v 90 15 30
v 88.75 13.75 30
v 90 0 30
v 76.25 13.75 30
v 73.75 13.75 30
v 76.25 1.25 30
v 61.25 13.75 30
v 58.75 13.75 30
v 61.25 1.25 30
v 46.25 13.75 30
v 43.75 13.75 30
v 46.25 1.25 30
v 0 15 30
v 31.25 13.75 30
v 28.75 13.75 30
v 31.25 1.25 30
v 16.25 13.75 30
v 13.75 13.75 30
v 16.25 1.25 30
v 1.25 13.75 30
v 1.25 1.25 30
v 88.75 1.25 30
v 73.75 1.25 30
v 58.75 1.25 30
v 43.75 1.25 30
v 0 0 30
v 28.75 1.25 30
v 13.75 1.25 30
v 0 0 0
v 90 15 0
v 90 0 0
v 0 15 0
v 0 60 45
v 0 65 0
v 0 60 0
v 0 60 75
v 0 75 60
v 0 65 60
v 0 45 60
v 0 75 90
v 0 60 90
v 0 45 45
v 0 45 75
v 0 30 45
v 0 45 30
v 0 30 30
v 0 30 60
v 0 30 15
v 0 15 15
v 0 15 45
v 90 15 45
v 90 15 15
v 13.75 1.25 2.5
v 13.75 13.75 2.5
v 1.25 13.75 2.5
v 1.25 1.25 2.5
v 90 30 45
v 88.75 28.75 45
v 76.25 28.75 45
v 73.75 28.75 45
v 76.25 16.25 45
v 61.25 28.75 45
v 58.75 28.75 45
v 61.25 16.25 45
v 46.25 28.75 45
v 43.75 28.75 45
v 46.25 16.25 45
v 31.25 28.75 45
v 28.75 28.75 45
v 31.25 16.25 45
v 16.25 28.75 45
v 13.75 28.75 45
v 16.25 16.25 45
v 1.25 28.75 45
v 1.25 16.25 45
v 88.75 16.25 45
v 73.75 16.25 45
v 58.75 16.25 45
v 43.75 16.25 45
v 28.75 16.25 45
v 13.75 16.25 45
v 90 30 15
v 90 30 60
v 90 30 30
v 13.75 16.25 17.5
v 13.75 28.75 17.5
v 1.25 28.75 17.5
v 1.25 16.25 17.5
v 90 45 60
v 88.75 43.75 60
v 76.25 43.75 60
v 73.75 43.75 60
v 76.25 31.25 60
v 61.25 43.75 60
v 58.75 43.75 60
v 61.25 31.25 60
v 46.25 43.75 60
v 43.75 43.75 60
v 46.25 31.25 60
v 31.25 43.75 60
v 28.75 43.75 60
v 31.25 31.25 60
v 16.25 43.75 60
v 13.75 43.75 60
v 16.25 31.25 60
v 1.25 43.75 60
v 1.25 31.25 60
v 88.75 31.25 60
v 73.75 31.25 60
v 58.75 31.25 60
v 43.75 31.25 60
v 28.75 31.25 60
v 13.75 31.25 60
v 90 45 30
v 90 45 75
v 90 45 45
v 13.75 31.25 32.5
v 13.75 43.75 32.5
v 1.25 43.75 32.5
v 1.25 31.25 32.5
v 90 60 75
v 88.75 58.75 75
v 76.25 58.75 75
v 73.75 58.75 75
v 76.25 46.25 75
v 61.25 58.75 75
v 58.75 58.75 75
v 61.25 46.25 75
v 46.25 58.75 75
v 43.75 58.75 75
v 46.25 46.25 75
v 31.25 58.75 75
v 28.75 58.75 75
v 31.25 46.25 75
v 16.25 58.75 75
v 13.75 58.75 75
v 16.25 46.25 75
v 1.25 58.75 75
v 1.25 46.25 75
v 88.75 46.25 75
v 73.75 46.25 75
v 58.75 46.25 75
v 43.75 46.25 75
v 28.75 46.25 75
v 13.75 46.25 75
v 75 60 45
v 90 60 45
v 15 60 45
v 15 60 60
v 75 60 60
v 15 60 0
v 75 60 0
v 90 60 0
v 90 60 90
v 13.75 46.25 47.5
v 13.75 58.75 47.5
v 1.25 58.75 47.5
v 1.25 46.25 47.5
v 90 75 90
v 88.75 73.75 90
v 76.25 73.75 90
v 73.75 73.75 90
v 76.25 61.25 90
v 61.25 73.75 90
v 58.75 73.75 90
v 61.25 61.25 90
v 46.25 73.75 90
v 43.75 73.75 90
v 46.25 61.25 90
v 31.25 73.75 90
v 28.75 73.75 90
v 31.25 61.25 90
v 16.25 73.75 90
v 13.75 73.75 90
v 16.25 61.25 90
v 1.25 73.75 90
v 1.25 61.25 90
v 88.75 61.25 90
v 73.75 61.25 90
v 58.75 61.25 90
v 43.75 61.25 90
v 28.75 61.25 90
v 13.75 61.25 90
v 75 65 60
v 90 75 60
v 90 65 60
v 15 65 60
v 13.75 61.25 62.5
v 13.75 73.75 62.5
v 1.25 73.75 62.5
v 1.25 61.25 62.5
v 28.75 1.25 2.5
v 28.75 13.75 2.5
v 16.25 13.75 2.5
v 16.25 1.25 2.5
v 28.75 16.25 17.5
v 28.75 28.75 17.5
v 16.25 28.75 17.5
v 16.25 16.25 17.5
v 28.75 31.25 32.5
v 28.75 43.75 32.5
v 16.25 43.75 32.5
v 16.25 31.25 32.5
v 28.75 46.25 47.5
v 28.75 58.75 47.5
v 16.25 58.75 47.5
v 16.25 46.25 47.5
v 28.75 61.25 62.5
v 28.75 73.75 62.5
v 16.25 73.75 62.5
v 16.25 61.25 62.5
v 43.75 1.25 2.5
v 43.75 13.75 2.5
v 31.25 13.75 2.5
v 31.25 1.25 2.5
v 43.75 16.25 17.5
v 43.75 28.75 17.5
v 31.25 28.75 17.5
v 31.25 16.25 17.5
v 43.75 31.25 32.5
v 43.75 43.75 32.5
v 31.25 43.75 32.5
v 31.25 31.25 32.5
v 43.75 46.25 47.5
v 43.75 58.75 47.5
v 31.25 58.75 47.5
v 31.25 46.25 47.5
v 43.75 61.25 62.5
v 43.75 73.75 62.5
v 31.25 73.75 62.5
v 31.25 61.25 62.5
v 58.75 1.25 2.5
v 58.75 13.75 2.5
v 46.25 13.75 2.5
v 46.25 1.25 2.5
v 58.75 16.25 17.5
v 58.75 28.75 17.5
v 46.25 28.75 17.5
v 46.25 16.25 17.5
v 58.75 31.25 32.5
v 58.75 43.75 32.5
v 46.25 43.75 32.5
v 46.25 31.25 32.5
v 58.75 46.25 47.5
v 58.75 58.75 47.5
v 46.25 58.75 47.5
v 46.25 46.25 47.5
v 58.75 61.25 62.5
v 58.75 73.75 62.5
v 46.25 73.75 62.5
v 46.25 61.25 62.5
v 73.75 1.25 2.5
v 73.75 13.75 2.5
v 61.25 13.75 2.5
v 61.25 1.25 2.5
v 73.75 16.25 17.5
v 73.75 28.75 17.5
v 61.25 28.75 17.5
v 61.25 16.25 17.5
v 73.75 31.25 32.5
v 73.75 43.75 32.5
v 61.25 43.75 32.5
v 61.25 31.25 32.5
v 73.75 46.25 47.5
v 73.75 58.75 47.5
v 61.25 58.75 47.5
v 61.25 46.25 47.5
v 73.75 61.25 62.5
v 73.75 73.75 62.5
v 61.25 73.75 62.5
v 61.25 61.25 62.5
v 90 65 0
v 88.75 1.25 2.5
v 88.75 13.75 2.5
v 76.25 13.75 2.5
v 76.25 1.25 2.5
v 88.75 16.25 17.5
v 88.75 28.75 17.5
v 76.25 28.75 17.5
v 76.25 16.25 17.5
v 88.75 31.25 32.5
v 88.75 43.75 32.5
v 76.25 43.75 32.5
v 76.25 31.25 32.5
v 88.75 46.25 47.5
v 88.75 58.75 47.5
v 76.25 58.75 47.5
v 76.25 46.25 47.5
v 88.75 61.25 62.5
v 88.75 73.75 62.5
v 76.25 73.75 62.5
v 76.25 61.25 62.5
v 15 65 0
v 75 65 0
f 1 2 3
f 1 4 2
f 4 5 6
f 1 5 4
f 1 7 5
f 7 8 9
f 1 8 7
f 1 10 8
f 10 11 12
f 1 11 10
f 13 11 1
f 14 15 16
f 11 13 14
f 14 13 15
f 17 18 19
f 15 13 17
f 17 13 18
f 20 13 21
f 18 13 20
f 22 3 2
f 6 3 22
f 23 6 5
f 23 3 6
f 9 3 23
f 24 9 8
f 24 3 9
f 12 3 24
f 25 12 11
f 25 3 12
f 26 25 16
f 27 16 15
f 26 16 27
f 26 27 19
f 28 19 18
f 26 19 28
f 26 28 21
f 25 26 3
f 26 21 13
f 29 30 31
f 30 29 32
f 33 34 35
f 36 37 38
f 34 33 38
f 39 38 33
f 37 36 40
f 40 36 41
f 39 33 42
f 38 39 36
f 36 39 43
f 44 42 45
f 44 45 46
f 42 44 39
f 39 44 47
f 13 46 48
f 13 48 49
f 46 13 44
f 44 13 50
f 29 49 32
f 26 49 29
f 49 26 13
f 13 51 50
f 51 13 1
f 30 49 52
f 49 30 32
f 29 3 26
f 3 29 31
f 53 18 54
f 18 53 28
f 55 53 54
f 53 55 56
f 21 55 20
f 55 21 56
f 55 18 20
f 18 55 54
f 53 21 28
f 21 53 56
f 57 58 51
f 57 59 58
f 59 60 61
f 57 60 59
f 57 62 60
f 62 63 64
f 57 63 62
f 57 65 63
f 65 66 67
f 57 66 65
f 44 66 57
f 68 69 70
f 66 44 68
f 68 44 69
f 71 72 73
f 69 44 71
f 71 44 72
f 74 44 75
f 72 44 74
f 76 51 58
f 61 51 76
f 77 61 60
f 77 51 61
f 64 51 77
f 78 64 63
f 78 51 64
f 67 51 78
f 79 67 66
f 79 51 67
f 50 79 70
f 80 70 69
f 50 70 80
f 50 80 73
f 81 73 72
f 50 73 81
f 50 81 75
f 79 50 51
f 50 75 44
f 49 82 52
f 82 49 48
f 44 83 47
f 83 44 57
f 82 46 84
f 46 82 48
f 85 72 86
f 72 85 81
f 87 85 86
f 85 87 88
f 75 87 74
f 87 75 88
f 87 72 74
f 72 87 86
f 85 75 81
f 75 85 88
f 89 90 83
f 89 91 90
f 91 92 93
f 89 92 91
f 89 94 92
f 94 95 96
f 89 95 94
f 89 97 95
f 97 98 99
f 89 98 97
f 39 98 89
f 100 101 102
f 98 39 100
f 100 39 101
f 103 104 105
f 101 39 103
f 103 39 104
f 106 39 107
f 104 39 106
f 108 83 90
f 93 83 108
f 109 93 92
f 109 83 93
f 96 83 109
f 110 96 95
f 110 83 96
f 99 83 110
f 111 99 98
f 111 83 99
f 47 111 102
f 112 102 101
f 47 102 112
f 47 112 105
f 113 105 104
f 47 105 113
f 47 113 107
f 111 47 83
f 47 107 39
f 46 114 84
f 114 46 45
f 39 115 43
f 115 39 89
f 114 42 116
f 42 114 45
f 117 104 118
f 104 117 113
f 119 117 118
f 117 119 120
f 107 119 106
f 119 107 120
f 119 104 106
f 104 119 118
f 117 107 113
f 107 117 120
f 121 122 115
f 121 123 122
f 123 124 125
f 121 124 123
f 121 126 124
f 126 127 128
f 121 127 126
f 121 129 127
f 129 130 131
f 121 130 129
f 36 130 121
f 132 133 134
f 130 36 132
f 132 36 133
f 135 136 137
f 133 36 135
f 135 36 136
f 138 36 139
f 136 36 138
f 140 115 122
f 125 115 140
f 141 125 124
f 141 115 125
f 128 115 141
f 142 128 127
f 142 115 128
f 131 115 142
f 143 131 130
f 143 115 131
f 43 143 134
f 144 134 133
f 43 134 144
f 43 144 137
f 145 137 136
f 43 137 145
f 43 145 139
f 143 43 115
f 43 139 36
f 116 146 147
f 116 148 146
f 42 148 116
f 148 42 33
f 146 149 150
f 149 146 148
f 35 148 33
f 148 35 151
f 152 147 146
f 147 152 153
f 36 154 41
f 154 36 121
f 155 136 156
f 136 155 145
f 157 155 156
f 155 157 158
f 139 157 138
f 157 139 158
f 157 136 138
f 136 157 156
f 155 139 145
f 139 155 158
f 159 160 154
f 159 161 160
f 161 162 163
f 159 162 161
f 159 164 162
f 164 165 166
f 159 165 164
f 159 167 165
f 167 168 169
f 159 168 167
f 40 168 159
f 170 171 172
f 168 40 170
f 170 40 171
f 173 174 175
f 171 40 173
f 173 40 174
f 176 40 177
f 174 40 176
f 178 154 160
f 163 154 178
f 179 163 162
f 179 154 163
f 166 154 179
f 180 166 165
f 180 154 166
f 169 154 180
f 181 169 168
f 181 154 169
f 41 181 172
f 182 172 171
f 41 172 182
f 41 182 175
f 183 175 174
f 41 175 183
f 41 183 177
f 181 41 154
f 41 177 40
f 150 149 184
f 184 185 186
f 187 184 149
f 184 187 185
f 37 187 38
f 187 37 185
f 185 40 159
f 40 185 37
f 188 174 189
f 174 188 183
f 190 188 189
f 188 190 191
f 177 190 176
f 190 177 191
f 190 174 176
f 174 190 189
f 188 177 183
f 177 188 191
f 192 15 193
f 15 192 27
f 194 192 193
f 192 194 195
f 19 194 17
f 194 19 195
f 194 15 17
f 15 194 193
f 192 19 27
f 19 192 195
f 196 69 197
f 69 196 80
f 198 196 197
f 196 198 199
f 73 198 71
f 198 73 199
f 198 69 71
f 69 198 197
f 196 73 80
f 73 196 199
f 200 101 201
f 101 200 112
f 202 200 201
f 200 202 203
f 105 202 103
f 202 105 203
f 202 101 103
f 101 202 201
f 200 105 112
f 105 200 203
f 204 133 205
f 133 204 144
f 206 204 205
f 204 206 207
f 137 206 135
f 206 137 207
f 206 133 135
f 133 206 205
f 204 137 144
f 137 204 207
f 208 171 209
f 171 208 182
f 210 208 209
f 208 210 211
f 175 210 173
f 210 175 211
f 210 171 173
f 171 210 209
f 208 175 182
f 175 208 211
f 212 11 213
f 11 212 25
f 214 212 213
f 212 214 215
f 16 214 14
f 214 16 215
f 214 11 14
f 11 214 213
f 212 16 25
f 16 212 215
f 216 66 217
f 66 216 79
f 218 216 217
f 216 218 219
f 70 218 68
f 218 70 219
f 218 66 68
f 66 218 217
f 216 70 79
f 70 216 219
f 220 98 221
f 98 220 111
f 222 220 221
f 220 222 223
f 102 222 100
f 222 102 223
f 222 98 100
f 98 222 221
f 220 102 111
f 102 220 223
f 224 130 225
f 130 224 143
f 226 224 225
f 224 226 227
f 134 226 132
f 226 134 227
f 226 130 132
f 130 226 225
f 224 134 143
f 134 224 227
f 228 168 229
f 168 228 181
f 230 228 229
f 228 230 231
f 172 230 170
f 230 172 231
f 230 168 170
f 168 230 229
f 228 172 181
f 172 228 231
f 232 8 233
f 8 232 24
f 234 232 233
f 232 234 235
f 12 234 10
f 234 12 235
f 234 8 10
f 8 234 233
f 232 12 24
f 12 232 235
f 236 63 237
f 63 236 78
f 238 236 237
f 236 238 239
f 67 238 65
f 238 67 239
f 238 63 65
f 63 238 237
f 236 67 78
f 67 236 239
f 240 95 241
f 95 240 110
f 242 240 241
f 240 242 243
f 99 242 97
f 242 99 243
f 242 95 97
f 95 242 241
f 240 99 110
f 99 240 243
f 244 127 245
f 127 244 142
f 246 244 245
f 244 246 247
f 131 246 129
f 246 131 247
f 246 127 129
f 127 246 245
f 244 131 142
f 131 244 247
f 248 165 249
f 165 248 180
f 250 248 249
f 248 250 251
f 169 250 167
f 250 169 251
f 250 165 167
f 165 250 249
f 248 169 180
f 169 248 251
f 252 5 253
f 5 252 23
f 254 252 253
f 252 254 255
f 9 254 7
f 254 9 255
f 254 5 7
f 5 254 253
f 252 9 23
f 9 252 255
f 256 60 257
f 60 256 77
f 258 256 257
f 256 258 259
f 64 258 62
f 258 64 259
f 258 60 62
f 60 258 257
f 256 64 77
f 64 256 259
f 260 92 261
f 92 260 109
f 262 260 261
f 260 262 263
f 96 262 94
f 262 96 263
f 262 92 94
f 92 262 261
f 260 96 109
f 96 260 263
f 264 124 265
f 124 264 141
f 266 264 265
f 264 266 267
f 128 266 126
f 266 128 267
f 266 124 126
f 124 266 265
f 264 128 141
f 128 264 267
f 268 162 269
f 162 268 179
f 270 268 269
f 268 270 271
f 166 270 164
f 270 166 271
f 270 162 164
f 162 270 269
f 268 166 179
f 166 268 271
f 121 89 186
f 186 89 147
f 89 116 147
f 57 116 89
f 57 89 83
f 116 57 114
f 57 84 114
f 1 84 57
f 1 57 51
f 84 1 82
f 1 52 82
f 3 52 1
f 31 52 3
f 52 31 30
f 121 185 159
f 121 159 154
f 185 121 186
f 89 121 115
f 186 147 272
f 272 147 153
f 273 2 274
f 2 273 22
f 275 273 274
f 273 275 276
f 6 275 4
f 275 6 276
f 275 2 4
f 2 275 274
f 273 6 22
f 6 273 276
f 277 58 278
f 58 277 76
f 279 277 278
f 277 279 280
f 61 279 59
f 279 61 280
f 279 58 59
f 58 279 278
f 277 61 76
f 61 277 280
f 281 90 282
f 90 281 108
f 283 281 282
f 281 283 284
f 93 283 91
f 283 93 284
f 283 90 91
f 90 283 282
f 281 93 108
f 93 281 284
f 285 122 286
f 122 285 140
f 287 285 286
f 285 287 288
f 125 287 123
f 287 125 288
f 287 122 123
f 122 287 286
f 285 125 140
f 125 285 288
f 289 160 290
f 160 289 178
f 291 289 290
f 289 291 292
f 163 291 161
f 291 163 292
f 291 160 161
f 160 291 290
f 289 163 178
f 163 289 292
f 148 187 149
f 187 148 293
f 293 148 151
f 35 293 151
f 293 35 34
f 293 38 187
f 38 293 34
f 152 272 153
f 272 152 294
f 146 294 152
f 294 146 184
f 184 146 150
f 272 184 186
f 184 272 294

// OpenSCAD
xqty = 5;       // Number of slots on x axis
yqty = 4;       // Number of slots on y axis
ystep = 15;     // mm increasing at each y axis
thick = 2.5;    // thickness of the frame
edge = 15;      // side of the slot
height = 30;    // height of the slot

/* a single module */
module slot(thick,edge) {
        difference() {
                cube([edge,edge,height]);
                translate([thick/2,thick/2,thick])
                        cube([edge-thick,edge-thick,height]);
        }
}

/* modules' ladder */
for (i=[0:xqty],ii=[0:yqty]) {
        translate([edge*i,edge*ii,ystep*ii])
        slot(thick,edge);
}

/* back side supports */
module support() {
        cube([edge,edge/3,(yqty)*ystep]);
}
translate([0,yqty*edge,0]) support();
translate([xqty*edge,yqty*edge,0]) support();
